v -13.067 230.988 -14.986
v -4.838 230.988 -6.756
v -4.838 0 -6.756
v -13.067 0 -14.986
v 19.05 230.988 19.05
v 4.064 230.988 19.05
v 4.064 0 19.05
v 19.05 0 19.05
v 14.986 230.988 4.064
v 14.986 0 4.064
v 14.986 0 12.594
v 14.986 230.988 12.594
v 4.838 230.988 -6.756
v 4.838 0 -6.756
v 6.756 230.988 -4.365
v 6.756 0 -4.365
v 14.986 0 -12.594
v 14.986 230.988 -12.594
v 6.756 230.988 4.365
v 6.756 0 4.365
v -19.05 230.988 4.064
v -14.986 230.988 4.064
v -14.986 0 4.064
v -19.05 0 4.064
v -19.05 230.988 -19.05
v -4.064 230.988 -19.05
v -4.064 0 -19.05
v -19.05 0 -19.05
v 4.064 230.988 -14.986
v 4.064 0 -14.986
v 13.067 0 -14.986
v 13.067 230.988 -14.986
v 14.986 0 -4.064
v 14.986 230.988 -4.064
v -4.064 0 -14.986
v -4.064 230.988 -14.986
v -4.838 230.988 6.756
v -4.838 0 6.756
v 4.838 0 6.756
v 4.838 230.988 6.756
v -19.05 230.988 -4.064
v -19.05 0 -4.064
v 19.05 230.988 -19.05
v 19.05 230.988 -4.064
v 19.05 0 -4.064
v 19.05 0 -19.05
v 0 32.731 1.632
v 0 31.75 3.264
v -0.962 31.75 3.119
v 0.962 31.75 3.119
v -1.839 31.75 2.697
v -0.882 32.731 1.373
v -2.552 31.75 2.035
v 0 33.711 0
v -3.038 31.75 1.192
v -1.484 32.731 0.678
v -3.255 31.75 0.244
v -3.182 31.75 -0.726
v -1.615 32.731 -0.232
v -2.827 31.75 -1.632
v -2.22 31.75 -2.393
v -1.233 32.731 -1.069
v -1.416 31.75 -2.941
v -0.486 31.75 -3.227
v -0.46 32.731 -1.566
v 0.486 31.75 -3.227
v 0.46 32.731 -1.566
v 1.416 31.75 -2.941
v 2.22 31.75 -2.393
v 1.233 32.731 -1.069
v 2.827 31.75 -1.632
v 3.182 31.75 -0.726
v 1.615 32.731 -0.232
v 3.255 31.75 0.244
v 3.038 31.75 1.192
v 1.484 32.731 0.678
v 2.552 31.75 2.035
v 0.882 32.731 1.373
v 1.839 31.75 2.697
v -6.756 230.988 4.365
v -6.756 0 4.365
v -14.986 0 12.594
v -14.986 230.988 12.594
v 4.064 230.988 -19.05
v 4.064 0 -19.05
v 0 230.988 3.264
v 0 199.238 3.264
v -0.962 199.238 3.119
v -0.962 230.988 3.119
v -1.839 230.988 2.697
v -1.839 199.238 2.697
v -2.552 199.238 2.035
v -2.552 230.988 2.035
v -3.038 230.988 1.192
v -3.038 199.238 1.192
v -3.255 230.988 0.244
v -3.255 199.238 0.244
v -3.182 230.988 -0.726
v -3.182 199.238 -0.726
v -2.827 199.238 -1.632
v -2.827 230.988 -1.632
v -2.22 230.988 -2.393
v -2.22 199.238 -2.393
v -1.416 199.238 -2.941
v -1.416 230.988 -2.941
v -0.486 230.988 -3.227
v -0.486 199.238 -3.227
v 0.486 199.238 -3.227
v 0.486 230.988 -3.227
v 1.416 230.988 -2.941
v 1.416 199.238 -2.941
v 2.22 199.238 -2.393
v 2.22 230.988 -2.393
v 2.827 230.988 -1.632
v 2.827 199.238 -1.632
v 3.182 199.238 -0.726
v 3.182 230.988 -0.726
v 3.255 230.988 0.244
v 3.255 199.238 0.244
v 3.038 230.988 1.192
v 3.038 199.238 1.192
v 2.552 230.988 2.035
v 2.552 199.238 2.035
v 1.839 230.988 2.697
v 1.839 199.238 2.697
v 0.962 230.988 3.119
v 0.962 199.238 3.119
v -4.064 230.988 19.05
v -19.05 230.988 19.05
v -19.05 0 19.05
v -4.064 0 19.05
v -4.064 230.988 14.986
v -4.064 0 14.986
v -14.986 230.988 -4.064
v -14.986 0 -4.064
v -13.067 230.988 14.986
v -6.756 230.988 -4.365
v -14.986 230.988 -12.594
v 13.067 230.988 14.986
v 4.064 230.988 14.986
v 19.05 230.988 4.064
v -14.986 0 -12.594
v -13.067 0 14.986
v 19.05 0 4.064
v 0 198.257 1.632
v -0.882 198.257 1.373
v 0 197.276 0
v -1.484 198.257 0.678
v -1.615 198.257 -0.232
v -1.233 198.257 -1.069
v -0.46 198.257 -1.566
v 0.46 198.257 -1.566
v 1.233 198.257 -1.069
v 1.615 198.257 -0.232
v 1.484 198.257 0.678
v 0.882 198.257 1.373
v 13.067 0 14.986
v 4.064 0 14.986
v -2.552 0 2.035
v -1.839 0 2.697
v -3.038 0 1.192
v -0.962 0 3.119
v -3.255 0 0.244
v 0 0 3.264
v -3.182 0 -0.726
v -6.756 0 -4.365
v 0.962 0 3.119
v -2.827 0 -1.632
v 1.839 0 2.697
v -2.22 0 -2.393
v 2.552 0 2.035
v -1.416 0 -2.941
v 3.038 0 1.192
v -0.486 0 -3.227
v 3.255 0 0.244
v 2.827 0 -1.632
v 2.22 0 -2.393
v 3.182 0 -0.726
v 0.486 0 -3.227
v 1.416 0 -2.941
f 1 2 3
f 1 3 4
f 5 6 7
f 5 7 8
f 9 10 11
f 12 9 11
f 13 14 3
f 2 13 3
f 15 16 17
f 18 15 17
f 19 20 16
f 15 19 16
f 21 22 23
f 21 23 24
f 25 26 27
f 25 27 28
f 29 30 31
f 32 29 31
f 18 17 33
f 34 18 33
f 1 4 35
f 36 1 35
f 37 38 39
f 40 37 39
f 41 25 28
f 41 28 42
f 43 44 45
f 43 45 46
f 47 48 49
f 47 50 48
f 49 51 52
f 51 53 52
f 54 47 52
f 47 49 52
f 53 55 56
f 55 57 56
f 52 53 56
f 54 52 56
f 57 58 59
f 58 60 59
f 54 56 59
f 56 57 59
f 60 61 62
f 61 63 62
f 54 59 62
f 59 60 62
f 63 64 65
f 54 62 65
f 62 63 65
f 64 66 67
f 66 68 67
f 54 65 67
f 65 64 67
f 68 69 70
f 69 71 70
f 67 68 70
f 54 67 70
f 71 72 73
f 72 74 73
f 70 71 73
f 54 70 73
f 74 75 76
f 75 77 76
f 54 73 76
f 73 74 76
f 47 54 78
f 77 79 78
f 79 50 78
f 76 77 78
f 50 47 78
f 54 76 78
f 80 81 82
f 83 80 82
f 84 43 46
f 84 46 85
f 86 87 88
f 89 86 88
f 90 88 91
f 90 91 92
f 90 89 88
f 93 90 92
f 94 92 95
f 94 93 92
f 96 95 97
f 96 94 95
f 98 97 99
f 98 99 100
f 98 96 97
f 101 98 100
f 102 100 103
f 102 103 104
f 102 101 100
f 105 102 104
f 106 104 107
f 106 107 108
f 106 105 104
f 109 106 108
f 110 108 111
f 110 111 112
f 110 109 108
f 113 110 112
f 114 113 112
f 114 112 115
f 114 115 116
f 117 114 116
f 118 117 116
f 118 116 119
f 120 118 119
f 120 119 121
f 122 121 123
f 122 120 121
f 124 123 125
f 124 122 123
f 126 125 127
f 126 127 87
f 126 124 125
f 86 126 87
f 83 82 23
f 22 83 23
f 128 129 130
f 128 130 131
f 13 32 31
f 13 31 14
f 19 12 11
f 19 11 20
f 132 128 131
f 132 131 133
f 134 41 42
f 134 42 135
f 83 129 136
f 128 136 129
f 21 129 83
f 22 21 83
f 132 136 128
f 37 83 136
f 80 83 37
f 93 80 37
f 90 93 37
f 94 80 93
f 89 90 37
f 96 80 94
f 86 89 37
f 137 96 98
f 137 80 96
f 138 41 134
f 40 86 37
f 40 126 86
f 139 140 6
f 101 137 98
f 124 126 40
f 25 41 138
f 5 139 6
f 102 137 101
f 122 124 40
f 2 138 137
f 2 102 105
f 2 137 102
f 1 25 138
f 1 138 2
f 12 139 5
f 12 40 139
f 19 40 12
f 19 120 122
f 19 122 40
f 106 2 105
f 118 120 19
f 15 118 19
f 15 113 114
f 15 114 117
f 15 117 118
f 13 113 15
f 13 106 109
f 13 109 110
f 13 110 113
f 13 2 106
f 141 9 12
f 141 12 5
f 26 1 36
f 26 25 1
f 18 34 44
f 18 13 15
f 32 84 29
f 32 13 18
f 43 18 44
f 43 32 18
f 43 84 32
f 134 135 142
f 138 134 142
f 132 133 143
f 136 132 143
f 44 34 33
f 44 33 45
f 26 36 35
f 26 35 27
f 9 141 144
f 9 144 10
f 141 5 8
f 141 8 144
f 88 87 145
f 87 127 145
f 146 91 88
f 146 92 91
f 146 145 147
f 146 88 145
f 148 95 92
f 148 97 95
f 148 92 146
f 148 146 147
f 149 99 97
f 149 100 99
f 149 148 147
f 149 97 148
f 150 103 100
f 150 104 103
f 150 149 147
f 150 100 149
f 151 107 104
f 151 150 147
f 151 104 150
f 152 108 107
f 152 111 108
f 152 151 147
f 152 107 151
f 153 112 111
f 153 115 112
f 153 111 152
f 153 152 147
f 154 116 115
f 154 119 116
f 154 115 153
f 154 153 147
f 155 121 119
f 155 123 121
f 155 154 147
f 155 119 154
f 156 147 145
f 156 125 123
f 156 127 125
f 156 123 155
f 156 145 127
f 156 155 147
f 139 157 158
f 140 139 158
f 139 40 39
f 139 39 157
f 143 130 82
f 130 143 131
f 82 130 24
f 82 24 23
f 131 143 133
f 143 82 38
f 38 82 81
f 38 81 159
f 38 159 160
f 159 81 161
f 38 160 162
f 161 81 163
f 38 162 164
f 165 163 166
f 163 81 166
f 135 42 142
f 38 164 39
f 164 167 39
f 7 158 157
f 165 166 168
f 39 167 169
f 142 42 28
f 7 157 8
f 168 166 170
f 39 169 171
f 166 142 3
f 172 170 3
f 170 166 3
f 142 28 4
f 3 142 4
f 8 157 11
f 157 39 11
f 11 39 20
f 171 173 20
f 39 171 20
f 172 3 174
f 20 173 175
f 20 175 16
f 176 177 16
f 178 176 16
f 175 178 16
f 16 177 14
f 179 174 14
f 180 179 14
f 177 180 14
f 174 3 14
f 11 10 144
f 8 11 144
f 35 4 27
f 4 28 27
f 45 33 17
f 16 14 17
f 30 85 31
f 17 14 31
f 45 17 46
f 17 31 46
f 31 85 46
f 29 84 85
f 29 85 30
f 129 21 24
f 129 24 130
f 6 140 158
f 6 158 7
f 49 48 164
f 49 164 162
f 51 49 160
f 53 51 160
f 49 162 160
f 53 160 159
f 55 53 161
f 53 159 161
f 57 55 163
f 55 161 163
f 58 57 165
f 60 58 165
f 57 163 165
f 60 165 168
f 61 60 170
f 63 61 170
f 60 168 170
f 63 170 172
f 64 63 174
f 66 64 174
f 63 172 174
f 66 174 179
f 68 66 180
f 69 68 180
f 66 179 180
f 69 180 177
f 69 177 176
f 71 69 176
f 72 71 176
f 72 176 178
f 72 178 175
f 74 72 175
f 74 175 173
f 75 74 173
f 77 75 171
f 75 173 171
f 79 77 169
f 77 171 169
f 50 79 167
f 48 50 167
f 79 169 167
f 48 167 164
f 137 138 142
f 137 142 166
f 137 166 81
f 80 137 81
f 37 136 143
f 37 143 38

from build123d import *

# Parameters (mm, degrees)
EXTRUDE1_DEPTH = 230.9876


# Read off the part's stored shape, not the designer's step: 1515<1>
with BuildPart() as part:
    # Sketch1<2> → Extrude1 (new body)
    with BuildSketch(Plane(origin=(0, 0, 0), x_dir=(1, 0, 0), z_dir=(0, 1, 0))):
        Polygon((-6.7564, 4.364749804), (-6.7564, -4.364749804), (-14.986, -12.594349804), (-14.986, -4.064), (-19.05, -4.064), (-19.05, -19.05), (-4.064, -19.05), (-4.064, -14.986), (-13.067127258, -14.986), (-4.837527258, -6.7564), (4.837527258, -6.7564), (13.067127258, -14.986), (4.064, -14.986), (4.064, -19.05), (19.05, -19.05), (19.05, -4.064), (14.986, -4.064), (14.986, -12.594349804), (6.7564, -4.364749804), (6.7564, 4.364749804), (14.986, 12.594349804), (14.986, 4.064), (19.05, 4.064), (19.05, 19.05), (4.064, 19.05), (4.064, 14.986), (13.067127258, 14.986), (4.837527258, 6.7564), (-4.837527258, 6.7564), (-13.067127258, 14.986), (-4.064, 14.986), (-4.064, 19.05), (-19.05, 19.05), (-19.05, 4.064), (-14.986, 4.064), (-14.986, 12.594349804), align=None)
    extrude(amount=EXTRUDE1_DEPTH)

    # Sketch2 → 5/16-18 Tapped Hole1 (revolve, cut)
    with BuildSketch(Plane(origin=(0, 230.9876, 0), x_dir=(0, 0, 1), z_dir=(1, 0, 0))):
        Polygon((0, 0), (0, 33.711148974), (3.2639, 31.75), (3.2639, 0), align=None)
    f_5_16_18_tapped_hole1 = revolve(axis=Axis((0, 237.3376, 0), (0, -1, 0)), mode=Mode.SUBTRACT)

    # Mirror1: 5/16-18 Tapped Hole1 across plane
    add(f_5_16_18_tapped_hole1.mirror(Plane.ZX.offset(115.4938)), mode=Mode.SUBTRACT)


solid = part.part
